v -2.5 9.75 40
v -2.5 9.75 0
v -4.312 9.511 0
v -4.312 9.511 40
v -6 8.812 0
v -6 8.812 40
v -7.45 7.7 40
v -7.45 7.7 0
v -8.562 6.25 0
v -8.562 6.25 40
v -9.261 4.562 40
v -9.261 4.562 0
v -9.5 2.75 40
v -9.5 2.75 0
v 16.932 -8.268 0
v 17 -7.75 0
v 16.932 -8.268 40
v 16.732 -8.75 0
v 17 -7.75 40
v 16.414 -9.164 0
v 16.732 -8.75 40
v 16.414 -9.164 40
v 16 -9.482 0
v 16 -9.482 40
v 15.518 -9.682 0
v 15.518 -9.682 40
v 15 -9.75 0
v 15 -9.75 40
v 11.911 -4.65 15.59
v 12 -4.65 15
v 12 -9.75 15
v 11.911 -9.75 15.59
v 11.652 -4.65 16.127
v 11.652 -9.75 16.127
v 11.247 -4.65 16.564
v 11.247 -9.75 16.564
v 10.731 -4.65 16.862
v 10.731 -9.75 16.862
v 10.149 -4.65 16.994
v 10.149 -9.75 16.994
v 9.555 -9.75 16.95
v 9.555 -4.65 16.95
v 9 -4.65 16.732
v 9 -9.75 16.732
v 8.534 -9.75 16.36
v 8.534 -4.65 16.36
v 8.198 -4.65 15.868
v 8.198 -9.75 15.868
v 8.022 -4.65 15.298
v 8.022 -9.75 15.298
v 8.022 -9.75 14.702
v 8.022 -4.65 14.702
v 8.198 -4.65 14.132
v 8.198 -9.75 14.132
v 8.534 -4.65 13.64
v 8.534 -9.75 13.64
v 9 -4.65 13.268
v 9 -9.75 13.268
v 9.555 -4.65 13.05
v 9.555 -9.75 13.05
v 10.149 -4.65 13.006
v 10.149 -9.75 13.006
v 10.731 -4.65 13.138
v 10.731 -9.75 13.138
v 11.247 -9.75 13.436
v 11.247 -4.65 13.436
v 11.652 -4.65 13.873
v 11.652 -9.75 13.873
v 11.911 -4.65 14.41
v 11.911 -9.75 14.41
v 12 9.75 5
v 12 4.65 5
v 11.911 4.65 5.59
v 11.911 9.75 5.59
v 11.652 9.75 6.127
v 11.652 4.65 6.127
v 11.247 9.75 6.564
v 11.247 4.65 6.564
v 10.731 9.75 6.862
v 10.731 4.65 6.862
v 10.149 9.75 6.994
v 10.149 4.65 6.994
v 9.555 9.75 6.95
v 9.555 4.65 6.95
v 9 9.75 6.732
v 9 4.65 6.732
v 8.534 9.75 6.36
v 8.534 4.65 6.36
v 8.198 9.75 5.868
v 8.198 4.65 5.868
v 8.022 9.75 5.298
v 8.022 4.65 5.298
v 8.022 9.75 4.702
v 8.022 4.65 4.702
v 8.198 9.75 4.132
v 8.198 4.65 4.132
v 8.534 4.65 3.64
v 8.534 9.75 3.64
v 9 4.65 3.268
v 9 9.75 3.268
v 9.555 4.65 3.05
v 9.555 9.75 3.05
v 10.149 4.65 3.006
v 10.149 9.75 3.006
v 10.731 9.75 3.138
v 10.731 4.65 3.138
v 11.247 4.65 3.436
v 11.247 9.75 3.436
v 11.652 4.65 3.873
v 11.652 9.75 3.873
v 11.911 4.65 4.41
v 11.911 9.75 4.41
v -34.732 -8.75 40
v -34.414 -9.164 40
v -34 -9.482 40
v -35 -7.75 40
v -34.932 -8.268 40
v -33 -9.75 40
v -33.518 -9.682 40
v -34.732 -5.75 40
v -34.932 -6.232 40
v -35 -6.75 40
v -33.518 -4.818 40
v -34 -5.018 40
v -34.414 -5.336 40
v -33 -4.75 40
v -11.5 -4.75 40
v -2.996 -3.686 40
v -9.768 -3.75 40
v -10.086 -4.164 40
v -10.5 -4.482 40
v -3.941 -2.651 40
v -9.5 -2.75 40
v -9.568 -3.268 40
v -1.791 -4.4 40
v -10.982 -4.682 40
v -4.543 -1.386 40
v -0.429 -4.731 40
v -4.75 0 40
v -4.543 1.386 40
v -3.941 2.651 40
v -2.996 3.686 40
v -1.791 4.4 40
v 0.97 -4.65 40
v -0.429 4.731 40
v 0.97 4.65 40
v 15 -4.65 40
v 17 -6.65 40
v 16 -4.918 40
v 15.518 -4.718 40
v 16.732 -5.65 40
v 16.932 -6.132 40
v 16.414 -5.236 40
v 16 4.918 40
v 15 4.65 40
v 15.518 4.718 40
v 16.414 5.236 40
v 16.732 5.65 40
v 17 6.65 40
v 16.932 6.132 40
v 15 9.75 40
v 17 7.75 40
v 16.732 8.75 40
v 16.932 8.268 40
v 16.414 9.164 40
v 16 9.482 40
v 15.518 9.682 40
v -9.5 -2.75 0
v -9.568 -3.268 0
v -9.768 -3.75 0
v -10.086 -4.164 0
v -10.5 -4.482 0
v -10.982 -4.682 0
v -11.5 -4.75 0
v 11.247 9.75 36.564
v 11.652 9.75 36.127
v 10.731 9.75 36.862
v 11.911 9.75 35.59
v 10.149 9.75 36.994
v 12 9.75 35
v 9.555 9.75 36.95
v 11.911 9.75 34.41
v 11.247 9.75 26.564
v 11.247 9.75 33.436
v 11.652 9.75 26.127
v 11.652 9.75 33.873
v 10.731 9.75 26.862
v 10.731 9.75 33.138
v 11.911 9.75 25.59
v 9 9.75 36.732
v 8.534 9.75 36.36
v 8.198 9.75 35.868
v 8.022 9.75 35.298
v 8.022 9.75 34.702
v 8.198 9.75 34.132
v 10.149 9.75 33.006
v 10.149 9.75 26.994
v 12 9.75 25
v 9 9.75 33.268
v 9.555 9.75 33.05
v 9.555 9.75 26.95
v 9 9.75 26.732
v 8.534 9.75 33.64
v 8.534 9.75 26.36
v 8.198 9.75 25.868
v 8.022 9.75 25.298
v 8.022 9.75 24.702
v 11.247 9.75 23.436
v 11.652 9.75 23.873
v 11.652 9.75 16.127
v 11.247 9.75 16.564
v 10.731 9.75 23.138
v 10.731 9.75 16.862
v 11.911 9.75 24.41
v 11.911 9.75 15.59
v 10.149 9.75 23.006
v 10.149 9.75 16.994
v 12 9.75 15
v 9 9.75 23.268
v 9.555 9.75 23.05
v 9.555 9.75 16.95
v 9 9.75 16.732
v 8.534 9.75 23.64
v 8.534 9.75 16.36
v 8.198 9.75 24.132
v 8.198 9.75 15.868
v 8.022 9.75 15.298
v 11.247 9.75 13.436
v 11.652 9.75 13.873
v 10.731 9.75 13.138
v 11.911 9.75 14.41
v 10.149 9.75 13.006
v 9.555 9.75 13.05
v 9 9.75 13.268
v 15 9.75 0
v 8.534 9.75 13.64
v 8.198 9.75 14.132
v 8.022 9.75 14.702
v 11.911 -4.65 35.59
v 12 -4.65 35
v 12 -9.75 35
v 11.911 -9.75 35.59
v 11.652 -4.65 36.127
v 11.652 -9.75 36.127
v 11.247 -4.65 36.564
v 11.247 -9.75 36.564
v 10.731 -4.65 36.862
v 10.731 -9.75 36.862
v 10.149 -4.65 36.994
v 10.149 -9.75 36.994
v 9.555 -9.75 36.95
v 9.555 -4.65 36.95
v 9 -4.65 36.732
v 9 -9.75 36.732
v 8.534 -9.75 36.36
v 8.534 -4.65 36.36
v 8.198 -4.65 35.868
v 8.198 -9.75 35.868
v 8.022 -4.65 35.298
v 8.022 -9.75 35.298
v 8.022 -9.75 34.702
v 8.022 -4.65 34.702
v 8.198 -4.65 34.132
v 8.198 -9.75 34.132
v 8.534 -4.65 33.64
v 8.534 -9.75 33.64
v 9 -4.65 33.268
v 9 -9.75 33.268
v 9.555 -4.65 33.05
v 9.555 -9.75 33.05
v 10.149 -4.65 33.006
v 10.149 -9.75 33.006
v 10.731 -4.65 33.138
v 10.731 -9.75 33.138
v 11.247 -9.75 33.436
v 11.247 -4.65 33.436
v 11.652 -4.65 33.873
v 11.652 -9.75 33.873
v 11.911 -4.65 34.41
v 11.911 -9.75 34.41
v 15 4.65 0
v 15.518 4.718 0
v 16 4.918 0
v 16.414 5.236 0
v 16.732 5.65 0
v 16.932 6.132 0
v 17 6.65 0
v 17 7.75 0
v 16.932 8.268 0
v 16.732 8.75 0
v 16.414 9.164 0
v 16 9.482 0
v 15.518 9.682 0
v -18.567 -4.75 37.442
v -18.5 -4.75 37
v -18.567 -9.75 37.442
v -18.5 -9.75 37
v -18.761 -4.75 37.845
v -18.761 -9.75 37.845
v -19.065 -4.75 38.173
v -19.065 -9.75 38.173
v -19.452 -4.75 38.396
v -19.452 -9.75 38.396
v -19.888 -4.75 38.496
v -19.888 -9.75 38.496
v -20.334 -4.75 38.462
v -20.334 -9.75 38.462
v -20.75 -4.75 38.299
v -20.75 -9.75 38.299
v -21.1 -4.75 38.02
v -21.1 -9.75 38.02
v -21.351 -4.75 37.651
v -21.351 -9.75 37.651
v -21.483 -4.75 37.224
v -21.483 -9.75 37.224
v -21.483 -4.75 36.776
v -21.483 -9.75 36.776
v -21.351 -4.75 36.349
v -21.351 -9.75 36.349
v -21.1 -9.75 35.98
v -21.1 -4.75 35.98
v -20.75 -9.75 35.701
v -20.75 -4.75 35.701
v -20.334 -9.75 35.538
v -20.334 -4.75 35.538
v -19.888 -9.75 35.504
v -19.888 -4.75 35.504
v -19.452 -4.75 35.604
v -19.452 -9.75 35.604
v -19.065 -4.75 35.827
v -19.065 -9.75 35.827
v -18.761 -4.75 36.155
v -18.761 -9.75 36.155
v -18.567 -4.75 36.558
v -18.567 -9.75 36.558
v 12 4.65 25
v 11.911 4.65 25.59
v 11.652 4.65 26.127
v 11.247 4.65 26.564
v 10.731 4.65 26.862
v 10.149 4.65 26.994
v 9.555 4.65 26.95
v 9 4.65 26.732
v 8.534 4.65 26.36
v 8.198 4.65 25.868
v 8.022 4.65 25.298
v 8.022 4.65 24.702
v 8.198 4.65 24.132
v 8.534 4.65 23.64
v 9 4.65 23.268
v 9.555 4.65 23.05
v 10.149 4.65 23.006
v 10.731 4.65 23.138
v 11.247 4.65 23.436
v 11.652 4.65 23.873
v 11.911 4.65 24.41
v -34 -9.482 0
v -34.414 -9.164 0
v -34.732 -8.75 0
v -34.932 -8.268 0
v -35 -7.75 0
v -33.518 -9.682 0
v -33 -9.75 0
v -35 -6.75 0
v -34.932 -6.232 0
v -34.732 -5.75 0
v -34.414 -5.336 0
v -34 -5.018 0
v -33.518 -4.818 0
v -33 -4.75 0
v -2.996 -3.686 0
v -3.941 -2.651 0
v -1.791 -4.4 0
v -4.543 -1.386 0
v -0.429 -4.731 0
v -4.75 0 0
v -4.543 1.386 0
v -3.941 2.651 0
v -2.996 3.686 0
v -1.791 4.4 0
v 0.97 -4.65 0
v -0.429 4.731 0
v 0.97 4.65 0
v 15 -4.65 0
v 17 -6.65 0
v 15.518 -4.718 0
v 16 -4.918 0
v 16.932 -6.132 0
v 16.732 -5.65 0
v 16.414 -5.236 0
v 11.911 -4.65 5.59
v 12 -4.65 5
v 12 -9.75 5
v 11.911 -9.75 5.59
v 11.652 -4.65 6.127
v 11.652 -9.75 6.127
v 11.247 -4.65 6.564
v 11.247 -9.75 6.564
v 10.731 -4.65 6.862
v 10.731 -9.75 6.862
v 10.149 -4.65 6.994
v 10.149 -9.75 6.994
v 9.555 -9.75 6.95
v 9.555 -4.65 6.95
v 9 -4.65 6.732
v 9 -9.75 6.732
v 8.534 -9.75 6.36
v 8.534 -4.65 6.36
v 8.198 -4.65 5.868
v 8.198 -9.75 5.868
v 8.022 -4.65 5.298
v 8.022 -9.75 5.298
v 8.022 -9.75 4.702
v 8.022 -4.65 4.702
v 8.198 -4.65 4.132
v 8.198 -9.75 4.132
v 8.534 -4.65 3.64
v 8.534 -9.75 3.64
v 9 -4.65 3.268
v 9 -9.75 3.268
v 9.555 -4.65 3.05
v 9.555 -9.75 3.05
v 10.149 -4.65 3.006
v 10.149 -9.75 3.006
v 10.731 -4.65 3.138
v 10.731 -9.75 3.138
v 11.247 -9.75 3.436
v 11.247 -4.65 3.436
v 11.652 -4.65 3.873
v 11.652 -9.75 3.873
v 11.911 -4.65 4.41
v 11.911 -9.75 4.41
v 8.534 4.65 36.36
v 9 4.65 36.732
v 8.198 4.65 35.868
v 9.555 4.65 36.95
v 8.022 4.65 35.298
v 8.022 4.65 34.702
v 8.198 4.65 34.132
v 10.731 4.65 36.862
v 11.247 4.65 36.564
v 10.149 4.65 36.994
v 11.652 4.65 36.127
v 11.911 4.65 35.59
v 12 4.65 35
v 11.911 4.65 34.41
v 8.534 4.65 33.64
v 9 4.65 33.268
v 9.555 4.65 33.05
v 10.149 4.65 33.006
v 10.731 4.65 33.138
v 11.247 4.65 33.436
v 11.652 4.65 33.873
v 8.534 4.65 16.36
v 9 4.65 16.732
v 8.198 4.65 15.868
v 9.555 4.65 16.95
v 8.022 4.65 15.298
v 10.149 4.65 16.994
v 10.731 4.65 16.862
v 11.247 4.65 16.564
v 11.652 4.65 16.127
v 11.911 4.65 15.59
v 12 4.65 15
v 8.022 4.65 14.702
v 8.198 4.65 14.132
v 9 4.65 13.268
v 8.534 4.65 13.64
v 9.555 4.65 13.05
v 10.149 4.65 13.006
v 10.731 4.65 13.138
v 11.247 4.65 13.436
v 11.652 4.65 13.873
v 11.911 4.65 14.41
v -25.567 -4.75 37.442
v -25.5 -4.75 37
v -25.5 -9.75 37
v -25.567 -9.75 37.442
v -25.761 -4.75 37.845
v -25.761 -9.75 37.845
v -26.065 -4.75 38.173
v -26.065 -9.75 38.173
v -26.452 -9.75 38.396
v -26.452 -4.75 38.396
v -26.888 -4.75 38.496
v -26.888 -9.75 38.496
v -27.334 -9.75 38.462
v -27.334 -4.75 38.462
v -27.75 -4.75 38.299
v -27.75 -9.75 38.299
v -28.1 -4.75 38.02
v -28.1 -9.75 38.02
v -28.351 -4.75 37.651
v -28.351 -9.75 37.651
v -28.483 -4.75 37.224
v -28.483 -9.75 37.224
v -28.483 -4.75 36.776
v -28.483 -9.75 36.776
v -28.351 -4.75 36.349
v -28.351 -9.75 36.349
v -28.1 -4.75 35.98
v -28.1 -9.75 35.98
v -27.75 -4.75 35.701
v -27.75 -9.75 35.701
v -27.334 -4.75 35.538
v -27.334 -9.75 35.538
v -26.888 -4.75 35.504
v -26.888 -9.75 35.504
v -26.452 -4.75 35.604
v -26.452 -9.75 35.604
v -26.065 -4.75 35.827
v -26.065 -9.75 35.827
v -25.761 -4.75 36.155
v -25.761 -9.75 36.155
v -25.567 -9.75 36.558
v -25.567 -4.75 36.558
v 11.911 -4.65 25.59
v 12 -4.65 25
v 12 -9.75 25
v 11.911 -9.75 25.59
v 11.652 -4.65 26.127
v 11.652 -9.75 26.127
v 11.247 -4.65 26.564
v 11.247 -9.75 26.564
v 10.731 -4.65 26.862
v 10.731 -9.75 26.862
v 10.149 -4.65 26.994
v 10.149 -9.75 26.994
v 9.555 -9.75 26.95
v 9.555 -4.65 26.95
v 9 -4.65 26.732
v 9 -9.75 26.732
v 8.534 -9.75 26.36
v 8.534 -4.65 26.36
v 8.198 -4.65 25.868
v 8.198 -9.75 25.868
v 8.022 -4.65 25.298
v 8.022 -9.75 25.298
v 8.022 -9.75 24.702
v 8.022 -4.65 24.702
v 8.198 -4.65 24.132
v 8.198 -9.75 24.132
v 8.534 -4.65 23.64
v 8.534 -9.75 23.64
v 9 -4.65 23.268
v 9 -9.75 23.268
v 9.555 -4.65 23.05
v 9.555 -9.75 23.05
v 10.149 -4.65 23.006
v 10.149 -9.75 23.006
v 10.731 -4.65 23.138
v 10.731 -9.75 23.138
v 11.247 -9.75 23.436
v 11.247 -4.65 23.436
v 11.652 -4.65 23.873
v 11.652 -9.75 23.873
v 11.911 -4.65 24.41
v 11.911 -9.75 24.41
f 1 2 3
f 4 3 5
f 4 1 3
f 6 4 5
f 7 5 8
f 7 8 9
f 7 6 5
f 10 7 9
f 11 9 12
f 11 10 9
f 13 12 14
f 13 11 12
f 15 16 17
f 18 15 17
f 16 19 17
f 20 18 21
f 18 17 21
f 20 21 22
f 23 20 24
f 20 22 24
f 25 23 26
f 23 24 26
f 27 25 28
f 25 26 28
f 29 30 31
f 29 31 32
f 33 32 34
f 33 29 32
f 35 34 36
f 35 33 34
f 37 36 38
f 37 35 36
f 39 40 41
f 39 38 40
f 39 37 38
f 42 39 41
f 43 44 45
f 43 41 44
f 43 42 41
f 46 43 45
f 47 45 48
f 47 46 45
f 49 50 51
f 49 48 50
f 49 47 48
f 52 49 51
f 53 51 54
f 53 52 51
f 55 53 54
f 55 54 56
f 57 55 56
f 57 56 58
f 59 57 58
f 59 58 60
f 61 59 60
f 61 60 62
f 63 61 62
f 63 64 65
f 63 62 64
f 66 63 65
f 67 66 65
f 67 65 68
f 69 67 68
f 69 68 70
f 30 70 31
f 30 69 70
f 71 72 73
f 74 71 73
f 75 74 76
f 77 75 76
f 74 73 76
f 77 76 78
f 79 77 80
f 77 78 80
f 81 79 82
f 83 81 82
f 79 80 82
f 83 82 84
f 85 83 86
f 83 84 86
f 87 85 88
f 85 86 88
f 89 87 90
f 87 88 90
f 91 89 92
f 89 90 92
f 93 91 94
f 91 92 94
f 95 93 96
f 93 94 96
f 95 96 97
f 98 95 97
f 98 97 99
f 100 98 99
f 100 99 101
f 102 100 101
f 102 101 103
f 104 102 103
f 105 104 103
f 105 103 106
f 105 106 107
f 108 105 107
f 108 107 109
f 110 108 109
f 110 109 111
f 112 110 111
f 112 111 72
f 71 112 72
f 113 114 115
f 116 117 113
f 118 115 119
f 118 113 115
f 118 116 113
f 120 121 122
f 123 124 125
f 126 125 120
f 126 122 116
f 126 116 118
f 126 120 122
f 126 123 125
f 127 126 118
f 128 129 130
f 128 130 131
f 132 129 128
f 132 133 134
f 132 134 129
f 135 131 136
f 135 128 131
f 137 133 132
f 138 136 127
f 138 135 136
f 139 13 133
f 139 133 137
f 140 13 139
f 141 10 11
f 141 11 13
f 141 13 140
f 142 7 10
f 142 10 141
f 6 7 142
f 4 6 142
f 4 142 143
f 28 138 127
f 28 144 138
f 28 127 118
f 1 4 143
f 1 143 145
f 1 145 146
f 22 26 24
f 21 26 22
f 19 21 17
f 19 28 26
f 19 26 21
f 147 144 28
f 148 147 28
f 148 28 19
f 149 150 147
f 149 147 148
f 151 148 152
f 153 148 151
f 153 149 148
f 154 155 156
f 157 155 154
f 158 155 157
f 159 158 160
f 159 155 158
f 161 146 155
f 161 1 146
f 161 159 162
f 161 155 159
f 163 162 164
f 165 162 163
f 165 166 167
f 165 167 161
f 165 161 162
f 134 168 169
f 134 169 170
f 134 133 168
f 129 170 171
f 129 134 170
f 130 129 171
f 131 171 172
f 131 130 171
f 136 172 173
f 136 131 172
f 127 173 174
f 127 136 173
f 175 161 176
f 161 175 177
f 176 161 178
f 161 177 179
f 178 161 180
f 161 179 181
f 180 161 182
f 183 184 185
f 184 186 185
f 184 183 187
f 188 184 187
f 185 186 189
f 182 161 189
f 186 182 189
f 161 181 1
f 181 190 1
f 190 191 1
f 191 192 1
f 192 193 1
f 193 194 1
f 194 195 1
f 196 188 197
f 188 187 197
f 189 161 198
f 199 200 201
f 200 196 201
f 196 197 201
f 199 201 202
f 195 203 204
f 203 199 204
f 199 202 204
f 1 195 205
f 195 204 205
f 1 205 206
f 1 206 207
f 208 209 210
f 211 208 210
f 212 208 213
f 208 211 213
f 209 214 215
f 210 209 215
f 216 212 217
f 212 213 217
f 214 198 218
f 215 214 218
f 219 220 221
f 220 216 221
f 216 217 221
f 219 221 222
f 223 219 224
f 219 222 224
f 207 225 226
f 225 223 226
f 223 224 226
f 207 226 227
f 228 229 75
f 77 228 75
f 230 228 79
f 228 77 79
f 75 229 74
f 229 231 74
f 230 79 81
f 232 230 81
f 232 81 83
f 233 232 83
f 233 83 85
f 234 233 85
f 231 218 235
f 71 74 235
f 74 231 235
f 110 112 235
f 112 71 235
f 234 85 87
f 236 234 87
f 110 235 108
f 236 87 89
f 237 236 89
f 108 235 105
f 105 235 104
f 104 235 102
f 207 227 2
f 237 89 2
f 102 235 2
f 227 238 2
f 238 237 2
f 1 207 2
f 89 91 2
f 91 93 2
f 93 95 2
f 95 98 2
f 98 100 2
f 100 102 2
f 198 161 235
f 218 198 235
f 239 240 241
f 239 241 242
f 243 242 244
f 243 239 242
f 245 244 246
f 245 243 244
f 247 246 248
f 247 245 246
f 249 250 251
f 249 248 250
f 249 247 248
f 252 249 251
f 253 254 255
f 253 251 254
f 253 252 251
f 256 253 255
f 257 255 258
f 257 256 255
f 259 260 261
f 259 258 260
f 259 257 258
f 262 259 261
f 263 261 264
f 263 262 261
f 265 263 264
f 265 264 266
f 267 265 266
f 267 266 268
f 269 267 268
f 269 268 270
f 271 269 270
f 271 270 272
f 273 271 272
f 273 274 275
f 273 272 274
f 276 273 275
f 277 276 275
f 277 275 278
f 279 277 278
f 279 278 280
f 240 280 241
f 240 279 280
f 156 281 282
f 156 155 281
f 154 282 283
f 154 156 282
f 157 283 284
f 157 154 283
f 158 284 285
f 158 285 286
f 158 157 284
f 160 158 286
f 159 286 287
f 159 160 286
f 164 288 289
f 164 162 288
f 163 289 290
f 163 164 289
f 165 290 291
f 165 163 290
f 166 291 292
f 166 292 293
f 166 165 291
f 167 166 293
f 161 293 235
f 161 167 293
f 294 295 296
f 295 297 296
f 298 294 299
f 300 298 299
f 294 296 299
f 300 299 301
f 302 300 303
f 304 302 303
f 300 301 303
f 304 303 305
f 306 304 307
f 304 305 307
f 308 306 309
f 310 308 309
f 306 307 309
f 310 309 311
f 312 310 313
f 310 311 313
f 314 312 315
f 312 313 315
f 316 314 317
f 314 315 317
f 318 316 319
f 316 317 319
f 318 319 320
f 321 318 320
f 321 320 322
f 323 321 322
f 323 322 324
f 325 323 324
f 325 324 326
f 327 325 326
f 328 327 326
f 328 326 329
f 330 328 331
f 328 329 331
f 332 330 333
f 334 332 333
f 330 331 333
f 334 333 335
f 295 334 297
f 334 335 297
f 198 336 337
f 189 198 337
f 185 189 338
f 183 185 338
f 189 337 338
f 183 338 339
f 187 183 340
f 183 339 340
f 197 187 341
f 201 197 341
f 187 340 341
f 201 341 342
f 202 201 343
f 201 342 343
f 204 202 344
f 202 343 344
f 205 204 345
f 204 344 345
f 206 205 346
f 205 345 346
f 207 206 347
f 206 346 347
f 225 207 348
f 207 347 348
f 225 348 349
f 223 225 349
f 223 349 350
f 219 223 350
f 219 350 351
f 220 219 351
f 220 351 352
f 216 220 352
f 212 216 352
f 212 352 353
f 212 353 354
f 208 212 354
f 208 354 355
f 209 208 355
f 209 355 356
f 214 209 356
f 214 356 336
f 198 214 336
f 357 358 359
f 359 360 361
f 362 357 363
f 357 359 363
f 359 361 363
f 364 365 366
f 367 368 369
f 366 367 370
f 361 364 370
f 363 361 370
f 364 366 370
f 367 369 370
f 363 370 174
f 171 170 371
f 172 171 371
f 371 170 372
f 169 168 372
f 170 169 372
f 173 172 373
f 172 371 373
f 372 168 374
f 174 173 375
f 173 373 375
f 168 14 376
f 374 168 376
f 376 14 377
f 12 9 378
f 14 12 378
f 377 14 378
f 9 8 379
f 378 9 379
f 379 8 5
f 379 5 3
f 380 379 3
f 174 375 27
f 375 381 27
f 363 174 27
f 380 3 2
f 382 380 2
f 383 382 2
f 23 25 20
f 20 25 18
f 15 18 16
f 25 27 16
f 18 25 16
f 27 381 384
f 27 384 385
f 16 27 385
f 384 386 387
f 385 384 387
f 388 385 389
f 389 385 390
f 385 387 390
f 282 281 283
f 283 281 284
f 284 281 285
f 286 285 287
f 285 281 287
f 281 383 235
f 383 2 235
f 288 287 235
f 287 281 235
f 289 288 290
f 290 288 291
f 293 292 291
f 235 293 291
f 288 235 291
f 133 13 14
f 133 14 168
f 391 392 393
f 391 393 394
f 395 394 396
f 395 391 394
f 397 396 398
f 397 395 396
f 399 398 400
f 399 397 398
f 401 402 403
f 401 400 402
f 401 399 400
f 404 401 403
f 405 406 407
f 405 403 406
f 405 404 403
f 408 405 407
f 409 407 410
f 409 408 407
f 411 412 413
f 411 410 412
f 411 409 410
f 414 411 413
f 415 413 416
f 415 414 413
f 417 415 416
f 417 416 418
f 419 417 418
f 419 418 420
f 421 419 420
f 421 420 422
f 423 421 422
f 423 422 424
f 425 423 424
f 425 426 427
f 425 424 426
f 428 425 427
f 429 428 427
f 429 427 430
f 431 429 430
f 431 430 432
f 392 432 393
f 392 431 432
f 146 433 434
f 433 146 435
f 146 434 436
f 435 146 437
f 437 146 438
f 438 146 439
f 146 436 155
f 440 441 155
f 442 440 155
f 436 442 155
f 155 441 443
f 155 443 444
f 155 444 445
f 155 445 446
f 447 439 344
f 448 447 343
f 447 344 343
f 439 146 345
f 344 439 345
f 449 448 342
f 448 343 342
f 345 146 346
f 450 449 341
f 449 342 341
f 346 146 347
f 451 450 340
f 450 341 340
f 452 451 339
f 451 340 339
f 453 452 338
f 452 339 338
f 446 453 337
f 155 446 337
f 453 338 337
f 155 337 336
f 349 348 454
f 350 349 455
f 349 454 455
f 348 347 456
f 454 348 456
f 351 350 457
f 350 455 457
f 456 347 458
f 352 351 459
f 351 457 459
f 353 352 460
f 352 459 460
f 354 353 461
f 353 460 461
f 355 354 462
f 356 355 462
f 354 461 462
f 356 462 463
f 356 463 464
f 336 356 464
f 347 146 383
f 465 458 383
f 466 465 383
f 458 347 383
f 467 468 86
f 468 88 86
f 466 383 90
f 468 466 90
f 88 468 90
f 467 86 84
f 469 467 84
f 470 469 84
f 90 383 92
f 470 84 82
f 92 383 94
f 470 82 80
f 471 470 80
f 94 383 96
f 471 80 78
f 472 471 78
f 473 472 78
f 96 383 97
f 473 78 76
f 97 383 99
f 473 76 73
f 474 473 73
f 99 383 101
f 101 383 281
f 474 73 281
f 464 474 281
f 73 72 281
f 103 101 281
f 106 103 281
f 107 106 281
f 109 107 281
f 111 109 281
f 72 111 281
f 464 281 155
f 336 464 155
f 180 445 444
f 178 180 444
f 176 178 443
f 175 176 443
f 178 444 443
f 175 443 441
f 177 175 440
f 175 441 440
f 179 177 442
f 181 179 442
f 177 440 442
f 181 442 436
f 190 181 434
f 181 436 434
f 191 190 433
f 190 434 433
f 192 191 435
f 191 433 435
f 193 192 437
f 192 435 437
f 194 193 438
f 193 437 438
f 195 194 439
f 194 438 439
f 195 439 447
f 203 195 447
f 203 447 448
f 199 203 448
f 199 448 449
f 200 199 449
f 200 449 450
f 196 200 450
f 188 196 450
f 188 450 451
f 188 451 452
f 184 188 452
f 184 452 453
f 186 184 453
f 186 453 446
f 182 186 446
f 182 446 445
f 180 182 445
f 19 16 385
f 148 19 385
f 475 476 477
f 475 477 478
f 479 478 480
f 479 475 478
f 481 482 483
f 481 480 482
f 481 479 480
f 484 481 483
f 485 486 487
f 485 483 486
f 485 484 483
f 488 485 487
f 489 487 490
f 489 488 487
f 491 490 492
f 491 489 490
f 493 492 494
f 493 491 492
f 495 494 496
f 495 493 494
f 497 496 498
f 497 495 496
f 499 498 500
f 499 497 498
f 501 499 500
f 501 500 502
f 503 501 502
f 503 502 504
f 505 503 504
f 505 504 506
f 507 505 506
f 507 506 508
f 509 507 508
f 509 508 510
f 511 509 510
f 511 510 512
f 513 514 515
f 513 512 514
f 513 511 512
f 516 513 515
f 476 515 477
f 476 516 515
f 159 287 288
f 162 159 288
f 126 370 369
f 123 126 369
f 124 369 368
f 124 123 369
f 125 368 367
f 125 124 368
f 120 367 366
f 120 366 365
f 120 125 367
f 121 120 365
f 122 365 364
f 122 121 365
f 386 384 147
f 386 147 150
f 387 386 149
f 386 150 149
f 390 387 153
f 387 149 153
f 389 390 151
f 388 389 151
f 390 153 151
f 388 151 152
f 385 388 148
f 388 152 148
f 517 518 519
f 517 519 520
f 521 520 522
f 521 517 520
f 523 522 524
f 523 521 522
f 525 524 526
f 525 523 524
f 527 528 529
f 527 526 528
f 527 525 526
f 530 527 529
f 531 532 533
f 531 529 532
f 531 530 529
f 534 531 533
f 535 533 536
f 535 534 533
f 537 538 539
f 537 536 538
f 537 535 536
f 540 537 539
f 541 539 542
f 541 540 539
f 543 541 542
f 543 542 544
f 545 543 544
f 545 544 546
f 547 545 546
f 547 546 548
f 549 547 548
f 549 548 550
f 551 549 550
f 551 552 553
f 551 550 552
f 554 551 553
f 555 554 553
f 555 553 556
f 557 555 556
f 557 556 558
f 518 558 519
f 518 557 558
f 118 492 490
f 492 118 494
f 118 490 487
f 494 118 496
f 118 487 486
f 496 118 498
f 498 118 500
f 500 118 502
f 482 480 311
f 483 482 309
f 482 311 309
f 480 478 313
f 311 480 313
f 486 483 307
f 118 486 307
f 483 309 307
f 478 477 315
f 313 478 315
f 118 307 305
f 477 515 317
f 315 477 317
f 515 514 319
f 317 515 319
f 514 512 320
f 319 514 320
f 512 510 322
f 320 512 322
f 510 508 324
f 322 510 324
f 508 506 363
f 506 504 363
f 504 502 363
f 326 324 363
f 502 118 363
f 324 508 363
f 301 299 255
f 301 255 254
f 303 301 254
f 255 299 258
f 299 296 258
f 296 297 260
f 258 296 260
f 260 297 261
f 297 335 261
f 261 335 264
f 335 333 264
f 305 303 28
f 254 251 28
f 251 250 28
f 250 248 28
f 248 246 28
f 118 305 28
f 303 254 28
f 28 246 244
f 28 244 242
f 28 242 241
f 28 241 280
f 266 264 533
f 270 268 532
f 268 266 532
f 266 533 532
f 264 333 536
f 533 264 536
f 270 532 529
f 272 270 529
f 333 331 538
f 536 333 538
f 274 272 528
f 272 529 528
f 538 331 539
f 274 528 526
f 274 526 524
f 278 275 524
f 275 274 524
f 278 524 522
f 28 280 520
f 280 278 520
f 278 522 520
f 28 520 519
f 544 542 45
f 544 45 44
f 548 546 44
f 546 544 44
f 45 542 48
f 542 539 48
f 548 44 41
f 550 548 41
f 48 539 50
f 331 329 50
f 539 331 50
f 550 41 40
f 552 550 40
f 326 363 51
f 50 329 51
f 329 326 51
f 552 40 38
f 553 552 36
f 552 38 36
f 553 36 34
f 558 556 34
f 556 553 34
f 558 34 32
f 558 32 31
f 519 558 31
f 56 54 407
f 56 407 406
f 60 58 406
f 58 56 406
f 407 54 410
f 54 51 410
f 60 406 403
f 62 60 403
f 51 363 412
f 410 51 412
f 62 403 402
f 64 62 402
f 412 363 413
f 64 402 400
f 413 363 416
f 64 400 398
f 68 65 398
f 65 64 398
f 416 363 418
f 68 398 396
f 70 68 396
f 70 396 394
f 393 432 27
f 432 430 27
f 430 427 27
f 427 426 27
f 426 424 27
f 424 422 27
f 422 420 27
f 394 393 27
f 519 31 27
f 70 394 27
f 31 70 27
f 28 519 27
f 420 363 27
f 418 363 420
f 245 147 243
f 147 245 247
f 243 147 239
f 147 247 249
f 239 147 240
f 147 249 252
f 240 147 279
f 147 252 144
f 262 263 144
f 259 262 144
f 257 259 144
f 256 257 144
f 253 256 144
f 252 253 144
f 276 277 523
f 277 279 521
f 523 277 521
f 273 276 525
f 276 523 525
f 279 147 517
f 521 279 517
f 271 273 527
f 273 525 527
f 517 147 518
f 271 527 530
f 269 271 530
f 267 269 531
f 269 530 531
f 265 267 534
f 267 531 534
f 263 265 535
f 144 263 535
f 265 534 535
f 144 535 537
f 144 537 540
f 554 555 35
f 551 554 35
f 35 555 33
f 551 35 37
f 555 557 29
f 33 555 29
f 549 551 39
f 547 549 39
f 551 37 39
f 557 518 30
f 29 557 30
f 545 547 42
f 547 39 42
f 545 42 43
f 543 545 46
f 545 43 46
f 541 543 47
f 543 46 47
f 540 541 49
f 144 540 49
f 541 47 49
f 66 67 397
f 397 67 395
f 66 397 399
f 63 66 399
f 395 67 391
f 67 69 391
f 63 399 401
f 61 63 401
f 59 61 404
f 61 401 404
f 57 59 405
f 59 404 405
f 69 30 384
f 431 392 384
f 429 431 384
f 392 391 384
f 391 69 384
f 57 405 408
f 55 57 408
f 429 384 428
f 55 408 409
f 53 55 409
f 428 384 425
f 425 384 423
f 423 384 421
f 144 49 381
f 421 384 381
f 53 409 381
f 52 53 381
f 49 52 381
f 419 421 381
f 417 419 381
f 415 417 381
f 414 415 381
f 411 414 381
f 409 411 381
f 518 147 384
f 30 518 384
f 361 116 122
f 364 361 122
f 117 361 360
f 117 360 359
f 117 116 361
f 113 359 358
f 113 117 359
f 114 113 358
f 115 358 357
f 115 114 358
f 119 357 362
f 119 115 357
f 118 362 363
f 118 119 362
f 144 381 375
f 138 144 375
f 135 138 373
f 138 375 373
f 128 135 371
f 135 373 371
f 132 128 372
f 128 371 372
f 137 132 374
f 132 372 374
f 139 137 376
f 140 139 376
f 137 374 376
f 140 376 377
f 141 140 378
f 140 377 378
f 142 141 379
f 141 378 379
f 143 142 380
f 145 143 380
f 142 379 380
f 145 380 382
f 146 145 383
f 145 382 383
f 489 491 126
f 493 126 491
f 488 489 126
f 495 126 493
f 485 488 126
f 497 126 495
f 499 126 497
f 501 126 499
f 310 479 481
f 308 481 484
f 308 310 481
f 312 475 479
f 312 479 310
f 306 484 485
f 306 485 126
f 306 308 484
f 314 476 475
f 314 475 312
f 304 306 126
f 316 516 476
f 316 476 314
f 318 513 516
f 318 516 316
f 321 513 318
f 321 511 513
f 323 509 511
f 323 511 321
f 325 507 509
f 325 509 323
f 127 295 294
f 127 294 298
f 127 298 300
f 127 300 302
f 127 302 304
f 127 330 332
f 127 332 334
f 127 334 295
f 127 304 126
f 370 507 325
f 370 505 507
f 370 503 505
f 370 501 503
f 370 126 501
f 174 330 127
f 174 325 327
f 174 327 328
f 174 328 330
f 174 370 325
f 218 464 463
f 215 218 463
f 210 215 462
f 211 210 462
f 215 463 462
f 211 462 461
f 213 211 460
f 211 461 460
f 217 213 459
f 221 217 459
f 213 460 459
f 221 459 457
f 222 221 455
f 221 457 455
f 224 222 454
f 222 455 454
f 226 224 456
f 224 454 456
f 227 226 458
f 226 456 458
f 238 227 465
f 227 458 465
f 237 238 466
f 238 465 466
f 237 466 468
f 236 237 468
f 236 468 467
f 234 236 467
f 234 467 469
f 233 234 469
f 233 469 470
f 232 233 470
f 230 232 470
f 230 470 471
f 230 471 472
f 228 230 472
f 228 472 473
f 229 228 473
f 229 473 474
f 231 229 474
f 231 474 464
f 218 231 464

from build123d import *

# Parameters (mm, degrees)
F0_W     = 25.5
F0_H     = 5
F1_DEPTH = 40
F2_R     = 2
F2_R_2   = 1.5
F3_DEPTH = 20
F4_R     = 2
F5_R     = 7


with BuildPart() as f1:
    # F0 (on Top) → F1 (new body)
    with BuildSketch(Plane.XY):
        with BuildLine():
            ThreePointArc((0.969536, -4.65), (-4.75, 0), (0.969536, 4.65))
            Line((0.969536, 4.65), (17, 4.65))
            Line((17, 4.65), (17, 9.75))
            Line((17, 9.75), (-9.5, 9.75))
            Line((-9.5, 9.75), (-9.5, -4.75))
            Line((-9.5, -4.75), (-9.5, -9.75))
            Line((-9.5, -9.75), (17, -9.75))
            Line((17, -9.75), (17, -4.65))
            Line((17, -4.65), (0.969536, -4.65))
        make_face()
        with Locations((-22.25, -7.25)):
            Rectangle(F0_W, F0_H)
    extrude(amount=F1_DEPTH)

    # F2 (on Front) → F3 (cut, symmetric)
    with BuildSketch(Plane.XZ):
        with Locations((10, 35)):
            Circle(F2_R)
        with Locations((10, 25)):
            Circle(F2_R)
        with Locations((10, 15)):
            Circle(F2_R)
        with Locations((10, 5)):
            Circle(F2_R)
        with Locations((-27, 37)):
            Circle(F2_R_2)
        with Locations((-20, 37)):
            Circle(F2_R_2)
    extrude(amount=F3_DEPTH, both=True, mode=Mode.SUBTRACT)

    # F4
    f4_edges = [f1.edges().sort_by_distance(p)[0] for p in [
        (-35, -9.75, 20),
        (-35, -4.75, 20),
        (17, -9.75, 20),
        (-9.5, -4.75, 20),
        (17, -4.65, 20),
        (17, 4.65, 20),
        (17, 9.75, 20),
    ]]
    fillet(f4_edges, radius=F4_R)

    # F5
    f5_edges = [f1.edges().sort_by_distance(p)[0] for p in [
        (-9.5, 9.75, 20),
    ]]
    fillet(f5_edges, radius=F5_R)


solid = f1.part
